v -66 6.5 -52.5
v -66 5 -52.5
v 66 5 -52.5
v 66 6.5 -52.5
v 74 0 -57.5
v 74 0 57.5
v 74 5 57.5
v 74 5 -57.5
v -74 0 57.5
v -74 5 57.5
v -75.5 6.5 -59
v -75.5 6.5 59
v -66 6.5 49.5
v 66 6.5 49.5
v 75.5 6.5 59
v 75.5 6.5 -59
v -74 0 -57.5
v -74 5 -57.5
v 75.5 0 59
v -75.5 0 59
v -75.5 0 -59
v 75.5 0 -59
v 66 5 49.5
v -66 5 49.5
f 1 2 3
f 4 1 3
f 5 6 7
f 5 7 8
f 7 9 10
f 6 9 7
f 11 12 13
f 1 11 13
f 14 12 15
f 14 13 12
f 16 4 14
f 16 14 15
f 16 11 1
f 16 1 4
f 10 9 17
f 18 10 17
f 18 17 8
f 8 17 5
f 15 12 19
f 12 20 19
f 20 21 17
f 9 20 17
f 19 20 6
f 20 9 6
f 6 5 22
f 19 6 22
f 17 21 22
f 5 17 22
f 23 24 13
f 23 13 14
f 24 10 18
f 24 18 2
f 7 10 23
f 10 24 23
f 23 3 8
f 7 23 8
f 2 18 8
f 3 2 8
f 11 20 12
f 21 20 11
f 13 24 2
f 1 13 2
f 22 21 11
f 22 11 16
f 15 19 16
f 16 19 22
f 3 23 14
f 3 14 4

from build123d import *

# Parameters (mm, degrees)
SKETCH1_W           = 151
SKETCH1_H           = 118
SKETCH1_W_2         = 148
SKETCH1_H_2         = 115
BOSS_EXTRUDE1_DEPTH = 5
SKETCH2_W           = 151
SKETCH2_H           = 118
SKETCH2_W_2         = 132
SKETCH2_H_2         = 102
BOSS_EXTRUDE2_DEPTH = 1.5


with BuildPart() as part:
    # Sketch1 → Boss-Extrude1 (new body)
    with BuildSketch(Plane(origin=(0, 0, 0), x_dir=(1, 0, 0), z_dir=(0, 1, 0))):
        Rectangle(SKETCH1_W, SKETCH1_H)
        Rectangle(SKETCH1_W_2, SKETCH1_H_2, mode=Mode.SUBTRACT)
    extrude(amount=BOSS_EXTRUDE1_DEPTH)

    # Sketch2 → Boss-Extrude2 (add)
    with BuildSketch(Plane(origin=(0, 5, 0), x_dir=(1, 0, 0), z_dir=(0, 1, 0))):
        Rectangle(SKETCH2_W, SKETCH2_H)
        with Locations((0, 1.5)):
            Rectangle(SKETCH2_W_2, SKETCH2_H_2, mode=Mode.SUBTRACT)
    extrude(amount=BOSS_EXTRUDE2_DEPTH)


solid = part.part
